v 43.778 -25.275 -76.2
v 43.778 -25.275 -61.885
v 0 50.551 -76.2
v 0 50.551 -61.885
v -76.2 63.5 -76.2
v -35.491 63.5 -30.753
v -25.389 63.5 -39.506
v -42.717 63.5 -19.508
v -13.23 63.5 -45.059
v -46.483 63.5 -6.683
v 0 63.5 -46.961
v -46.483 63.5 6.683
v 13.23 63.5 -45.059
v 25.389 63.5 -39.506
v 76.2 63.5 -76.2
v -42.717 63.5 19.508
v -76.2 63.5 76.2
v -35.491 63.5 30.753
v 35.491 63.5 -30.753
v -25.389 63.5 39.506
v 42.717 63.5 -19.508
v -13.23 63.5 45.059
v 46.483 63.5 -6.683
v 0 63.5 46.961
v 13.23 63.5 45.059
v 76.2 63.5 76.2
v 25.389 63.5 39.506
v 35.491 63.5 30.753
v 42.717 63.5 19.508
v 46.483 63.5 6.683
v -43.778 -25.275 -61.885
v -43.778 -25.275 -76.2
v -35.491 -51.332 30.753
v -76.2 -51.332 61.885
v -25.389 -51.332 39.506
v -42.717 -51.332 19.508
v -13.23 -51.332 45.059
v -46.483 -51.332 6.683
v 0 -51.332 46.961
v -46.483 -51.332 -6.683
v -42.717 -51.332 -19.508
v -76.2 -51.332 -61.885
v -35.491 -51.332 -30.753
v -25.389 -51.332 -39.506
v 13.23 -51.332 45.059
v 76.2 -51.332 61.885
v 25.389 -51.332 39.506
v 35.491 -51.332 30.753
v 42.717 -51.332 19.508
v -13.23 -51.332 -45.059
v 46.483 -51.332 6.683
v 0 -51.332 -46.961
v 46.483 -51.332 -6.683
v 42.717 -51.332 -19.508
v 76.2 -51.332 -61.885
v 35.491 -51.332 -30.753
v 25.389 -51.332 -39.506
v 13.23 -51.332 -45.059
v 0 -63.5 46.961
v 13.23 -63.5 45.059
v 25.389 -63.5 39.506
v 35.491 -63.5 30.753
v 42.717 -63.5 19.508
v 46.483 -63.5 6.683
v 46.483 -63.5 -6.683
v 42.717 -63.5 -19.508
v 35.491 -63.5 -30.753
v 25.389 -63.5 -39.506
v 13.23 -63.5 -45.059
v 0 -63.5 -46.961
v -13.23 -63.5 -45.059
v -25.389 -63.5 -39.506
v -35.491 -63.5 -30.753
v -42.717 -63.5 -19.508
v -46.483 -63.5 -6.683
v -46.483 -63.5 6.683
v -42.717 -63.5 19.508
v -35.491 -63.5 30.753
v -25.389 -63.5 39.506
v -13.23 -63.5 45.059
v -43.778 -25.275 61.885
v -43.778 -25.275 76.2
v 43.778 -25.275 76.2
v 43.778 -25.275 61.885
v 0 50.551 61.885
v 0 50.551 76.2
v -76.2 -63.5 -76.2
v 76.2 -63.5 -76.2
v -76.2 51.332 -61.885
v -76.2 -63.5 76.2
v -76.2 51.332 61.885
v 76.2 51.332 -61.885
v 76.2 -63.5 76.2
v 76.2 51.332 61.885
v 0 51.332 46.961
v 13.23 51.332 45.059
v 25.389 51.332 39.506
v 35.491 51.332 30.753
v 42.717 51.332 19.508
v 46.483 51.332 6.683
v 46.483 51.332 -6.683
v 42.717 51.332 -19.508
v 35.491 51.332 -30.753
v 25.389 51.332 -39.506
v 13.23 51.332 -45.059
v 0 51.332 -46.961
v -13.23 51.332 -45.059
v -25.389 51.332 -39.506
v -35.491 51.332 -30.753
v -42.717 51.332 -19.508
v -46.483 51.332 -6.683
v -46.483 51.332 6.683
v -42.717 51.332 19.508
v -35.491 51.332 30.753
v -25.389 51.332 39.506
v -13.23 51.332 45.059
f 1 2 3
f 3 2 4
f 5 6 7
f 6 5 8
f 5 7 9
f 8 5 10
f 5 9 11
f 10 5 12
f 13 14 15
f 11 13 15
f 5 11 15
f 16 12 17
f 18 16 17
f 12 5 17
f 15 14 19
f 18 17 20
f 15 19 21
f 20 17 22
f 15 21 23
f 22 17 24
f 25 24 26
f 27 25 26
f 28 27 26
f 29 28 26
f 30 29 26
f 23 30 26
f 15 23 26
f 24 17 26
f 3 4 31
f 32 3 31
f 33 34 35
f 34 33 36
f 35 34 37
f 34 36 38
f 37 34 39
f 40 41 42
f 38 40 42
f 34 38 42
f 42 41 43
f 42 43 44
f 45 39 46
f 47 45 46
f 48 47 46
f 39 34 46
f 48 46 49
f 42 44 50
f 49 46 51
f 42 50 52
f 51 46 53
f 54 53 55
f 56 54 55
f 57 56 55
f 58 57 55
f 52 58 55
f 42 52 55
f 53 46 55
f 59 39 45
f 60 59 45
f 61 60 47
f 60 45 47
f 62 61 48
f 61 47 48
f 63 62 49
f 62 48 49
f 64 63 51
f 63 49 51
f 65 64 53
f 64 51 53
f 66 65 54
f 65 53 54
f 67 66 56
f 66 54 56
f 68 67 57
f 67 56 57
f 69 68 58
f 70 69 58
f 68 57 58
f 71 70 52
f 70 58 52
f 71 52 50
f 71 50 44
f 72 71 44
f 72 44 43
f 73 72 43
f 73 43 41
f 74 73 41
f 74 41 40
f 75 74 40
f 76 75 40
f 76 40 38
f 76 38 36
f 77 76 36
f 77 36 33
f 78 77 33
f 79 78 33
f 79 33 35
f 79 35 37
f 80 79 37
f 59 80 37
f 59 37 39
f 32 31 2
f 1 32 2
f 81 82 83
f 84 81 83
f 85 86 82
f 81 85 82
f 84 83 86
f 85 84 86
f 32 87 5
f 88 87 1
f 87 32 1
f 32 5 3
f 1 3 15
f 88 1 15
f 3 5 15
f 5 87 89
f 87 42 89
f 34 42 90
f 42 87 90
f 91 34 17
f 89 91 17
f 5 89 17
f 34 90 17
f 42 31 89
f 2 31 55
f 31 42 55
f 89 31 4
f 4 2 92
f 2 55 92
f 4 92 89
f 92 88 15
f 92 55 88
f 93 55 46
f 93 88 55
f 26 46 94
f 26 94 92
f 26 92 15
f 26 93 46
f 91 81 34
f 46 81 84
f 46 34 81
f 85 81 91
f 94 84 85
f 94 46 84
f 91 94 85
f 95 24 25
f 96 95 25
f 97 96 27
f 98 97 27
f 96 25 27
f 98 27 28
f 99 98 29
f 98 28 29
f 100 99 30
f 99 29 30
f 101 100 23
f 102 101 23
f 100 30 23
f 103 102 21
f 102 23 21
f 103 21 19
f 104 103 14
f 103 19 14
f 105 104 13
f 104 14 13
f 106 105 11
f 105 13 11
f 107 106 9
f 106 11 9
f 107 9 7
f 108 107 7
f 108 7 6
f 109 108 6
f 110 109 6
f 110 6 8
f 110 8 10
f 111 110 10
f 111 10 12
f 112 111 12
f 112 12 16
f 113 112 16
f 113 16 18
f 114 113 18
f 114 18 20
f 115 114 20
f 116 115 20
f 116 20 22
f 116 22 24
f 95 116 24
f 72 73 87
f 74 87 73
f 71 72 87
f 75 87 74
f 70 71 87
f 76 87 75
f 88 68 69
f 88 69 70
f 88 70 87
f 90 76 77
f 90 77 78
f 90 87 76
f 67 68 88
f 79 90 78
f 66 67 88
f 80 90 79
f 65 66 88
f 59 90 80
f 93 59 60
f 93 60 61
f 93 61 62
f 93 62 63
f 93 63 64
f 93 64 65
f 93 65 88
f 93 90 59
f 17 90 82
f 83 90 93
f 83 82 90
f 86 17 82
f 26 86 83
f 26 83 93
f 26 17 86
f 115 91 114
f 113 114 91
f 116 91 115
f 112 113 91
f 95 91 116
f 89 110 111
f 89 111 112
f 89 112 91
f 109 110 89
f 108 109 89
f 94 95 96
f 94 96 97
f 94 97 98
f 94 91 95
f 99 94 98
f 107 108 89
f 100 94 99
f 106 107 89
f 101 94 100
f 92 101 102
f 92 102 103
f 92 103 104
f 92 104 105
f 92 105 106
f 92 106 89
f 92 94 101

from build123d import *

# Parameters (mm, degrees)
SKETCH1_W           = 152.4
SKETCH1_H           = 127
BOSS_EXTRUDE1_DEPTH = 76.2
CUT_EXTRUDE1_DEPTH  = 182.836327504
SKETCH3_W           = 123.769027692
SKETCH3_H           = 102.663904472
CUT_EXTRUDE2_DEPTH  = 182.836327504
SKETCH4_R           = 46.960856135
CUT_EXTRUDE3_DEPTH  = 167.558938517


with BuildPart() as part:
    # Sketch1 → Boss-Extrude1 (new, symmetric)
    with BuildSketch(Plane.XY):
        Rectangle(SKETCH1_W, SKETCH1_H)
    extrude(amount=BOSS_EXTRUDE1_DEPTH, both=True)

    # Sketch2 → Cut-Extrude1 (cut, through all)
    with BuildSketch(Plane.XY.offset(76.2)):
        Polygon((0, 50.550598249), (-43.77810226, -25.275299124), (43.77810226, -25.275299124), align=None)
    extrude(amount=-CUT_EXTRUDE1_DEPTH, mode=Mode.SUBTRACT)

    # Sketch3 → Cut-Extrude2 (cut, through all)
    with BuildSketch(Plane(origin=(76.2, 0, 0), x_dir=(0, 0, -1), z_dir=(1, 0, 0))):
        Rectangle(SKETCH3_W, SKETCH3_H)
    extrude(amount=-CUT_EXTRUDE2_DEPTH, mode=Mode.SUBTRACT)

    # Sketch4 → Cut-Extrude3 (cut, through all)
    with BuildSketch(Plane(origin=(0, 63.5, 0), x_dir=(1, 0, 0), z_dir=(0, 1, 0))):
        with Locations(Location((0, 0, 0), (0, 0, 270))):
            Circle(SKETCH4_R)
    extrude(amount=-CUT_EXTRUDE3_DEPTH, mode=Mode.SUBTRACT)


solid = part.part
